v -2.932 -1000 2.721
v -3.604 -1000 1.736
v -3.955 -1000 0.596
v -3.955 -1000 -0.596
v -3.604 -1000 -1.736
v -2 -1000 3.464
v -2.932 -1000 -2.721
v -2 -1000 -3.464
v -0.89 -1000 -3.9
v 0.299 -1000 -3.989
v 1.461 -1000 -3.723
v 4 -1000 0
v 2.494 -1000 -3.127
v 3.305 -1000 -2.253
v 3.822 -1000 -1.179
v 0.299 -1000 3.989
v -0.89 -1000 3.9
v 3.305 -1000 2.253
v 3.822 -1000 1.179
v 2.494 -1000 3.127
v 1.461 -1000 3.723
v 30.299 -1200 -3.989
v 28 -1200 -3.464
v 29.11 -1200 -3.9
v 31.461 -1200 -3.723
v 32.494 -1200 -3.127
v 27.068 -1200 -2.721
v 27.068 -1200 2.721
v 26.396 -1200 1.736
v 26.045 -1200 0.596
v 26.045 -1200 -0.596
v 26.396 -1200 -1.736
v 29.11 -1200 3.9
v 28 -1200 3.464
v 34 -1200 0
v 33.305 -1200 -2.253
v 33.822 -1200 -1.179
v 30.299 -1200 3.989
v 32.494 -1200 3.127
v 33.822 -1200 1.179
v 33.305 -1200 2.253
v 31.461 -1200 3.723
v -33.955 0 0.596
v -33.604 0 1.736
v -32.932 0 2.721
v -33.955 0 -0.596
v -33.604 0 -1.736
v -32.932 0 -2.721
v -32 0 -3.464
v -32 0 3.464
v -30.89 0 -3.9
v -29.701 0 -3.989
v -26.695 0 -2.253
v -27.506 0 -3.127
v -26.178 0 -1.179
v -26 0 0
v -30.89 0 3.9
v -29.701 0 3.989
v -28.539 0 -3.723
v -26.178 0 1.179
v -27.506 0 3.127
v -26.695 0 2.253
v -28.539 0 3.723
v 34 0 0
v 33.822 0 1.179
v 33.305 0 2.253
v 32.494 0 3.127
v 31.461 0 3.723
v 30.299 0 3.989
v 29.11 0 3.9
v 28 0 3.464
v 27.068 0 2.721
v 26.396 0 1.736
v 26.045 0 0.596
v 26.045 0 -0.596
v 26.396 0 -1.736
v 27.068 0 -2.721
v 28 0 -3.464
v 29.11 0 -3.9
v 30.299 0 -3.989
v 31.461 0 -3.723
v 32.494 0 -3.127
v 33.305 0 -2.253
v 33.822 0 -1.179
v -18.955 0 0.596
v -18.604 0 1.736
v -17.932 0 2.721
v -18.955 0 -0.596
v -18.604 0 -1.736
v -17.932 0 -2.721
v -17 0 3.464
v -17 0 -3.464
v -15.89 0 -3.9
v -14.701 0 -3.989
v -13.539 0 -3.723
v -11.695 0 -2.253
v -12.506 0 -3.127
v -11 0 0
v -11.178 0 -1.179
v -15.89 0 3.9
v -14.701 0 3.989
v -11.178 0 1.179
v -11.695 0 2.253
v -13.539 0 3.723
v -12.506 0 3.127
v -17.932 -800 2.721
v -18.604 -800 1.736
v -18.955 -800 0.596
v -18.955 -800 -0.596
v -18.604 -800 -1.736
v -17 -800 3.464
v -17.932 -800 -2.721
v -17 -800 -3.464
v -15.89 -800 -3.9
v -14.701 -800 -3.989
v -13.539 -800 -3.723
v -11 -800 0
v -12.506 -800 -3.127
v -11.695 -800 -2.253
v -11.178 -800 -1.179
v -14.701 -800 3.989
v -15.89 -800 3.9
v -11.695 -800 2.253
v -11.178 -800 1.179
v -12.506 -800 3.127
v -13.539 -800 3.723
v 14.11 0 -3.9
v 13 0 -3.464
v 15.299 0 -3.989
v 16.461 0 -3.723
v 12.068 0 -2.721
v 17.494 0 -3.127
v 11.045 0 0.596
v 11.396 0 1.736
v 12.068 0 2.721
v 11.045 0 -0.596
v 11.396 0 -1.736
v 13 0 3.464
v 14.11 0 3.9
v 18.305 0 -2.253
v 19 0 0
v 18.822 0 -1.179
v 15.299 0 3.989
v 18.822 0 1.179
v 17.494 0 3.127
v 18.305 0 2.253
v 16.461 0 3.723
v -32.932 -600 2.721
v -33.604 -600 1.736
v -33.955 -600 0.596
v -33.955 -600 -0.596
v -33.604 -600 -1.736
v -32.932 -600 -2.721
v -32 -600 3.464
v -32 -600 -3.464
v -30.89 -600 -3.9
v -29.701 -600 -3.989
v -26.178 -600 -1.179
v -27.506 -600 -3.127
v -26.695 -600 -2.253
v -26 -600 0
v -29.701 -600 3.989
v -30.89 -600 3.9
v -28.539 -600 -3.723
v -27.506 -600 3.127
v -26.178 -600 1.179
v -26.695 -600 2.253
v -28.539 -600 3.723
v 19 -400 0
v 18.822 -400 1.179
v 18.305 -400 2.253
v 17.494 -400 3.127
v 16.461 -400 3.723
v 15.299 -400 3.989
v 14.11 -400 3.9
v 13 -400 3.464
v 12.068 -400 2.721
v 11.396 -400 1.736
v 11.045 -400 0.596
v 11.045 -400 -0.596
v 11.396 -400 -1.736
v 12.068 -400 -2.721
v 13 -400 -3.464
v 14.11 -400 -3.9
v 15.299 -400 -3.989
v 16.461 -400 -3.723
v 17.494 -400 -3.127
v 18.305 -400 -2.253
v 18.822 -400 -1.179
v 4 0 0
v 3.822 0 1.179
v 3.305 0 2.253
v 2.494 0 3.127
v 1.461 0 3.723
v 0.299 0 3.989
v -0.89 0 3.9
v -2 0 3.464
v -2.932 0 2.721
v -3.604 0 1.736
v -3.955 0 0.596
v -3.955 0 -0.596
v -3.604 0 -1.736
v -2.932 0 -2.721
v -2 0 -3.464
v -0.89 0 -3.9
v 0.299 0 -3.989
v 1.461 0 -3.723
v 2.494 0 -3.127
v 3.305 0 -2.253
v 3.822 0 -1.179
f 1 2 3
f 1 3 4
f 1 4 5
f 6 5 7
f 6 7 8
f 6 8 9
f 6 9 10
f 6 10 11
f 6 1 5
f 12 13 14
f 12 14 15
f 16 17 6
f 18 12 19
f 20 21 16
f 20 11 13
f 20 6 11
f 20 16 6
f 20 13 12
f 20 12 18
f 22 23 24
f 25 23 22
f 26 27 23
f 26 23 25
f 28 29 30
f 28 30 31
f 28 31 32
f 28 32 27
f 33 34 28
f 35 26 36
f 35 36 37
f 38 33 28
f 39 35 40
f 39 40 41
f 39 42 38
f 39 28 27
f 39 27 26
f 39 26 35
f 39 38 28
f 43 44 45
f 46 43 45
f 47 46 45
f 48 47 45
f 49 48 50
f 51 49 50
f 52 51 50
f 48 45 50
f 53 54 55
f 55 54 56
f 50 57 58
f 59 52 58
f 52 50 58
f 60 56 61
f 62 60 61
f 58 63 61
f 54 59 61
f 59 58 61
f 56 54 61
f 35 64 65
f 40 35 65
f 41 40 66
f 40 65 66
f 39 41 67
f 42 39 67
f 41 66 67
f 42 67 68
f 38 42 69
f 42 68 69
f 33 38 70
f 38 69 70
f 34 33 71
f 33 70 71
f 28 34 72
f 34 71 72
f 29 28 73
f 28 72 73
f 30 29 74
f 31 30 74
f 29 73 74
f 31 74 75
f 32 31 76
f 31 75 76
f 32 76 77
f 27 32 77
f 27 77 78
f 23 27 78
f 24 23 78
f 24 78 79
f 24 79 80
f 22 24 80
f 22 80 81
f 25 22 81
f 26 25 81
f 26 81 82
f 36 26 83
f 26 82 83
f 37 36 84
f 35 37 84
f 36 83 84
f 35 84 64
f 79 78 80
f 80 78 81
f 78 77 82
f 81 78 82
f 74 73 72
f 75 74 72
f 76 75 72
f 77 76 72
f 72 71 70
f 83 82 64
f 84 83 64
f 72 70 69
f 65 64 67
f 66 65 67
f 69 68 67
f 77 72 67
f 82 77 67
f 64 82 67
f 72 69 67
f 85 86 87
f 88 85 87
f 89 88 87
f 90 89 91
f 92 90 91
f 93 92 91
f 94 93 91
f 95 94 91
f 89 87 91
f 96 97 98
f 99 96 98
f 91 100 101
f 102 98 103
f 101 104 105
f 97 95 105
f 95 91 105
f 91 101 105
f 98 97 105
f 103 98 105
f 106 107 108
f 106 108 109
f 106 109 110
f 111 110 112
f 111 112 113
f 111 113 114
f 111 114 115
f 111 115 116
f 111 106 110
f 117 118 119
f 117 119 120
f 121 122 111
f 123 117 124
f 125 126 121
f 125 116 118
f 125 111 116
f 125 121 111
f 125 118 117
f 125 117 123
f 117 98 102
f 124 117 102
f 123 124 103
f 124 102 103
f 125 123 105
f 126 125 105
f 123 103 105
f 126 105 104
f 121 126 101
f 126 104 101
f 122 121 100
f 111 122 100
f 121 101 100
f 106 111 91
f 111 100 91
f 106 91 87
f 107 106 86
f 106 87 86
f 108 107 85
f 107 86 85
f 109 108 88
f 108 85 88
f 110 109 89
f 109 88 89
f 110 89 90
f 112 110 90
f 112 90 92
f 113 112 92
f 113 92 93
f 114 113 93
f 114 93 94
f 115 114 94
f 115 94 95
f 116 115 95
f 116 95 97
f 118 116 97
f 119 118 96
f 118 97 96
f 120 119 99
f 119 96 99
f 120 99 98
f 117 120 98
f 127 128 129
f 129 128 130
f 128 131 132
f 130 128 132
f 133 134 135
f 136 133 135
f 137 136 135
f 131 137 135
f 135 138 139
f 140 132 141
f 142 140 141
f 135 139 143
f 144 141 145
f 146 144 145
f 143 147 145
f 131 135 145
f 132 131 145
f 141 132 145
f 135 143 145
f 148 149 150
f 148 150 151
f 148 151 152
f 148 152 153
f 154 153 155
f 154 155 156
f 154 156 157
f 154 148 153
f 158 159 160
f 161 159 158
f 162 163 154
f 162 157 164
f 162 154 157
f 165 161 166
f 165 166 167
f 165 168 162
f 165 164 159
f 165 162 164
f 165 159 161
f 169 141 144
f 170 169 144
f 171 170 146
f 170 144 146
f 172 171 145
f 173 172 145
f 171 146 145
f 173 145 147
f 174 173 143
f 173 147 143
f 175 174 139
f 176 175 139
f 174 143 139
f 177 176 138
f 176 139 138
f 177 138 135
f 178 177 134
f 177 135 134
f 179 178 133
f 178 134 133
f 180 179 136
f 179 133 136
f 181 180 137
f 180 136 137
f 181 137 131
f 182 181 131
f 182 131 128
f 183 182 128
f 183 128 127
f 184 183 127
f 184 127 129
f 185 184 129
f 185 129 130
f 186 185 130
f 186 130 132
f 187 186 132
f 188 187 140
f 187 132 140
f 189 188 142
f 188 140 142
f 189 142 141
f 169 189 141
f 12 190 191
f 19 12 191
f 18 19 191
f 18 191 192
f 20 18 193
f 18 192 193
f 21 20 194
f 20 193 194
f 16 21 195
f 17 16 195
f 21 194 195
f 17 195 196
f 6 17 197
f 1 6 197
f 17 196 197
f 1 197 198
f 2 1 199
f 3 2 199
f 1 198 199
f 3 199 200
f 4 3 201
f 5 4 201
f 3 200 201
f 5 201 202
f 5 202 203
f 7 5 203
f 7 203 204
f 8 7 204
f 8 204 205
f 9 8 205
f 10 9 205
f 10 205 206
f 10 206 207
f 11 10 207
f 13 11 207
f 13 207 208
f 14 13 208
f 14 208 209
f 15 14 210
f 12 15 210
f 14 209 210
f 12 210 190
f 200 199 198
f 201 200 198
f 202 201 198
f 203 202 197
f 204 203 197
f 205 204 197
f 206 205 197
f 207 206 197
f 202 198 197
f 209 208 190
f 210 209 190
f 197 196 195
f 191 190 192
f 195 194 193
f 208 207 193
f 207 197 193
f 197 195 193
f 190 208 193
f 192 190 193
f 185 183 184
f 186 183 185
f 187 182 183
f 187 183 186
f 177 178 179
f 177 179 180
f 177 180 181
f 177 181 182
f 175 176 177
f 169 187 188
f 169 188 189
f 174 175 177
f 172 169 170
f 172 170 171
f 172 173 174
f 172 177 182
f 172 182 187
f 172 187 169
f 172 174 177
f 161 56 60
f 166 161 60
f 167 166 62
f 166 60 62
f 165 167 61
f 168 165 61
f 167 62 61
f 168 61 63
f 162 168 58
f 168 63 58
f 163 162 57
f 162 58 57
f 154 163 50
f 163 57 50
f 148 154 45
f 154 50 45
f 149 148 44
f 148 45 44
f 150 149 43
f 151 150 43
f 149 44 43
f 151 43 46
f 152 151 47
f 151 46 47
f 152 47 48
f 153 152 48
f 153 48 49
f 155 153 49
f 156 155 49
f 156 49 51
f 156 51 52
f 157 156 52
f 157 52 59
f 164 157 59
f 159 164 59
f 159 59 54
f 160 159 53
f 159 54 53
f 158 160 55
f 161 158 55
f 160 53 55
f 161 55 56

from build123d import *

# Parameters (mm, degrees)
F0_R     = 4
F1_DEPTH = 1000
F2_DEPTH = 800
F3_DEPTH = 600
F4_DEPTH = 400
F5_DEPTH = 1200


with BuildPart() as f1:
    # F0 (on Front) → F1 (new body)
    with BuildSketch(Plane.XZ):
        Circle(F0_R)
    extrude(amount=F1_DEPTH)


with BuildPart() as f2:
    # F0 (on Front) → F2 (new body)
    with BuildSketch(Plane.XZ):
        with Locations((-15, 0)):
            Circle(F0_R)
    extrude(amount=F2_DEPTH)


with BuildPart() as f3:
    # F0 (on Front) → F3 (new body)
    with BuildSketch(Plane.XZ):
        with Locations((-30, 0)):
            Circle(F0_R)
    extrude(amount=F3_DEPTH)


with BuildPart() as f4:
    # F0 (on Front) → F4 (new body)
    with BuildSketch(Plane.XZ):
        with Locations((15, 0)):
            Circle(F0_R)
    extrude(amount=F4_DEPTH)


with BuildPart() as f5:
    # F0 (on Front) → F5 (new body)
    with BuildSketch(Plane.XZ):
        with Locations((30, 0)):
            Circle(F0_R)
    extrude(amount=F5_DEPTH)


solid = Compound([f1.part, f2.part, f3.part, f4.part, f5.part])
